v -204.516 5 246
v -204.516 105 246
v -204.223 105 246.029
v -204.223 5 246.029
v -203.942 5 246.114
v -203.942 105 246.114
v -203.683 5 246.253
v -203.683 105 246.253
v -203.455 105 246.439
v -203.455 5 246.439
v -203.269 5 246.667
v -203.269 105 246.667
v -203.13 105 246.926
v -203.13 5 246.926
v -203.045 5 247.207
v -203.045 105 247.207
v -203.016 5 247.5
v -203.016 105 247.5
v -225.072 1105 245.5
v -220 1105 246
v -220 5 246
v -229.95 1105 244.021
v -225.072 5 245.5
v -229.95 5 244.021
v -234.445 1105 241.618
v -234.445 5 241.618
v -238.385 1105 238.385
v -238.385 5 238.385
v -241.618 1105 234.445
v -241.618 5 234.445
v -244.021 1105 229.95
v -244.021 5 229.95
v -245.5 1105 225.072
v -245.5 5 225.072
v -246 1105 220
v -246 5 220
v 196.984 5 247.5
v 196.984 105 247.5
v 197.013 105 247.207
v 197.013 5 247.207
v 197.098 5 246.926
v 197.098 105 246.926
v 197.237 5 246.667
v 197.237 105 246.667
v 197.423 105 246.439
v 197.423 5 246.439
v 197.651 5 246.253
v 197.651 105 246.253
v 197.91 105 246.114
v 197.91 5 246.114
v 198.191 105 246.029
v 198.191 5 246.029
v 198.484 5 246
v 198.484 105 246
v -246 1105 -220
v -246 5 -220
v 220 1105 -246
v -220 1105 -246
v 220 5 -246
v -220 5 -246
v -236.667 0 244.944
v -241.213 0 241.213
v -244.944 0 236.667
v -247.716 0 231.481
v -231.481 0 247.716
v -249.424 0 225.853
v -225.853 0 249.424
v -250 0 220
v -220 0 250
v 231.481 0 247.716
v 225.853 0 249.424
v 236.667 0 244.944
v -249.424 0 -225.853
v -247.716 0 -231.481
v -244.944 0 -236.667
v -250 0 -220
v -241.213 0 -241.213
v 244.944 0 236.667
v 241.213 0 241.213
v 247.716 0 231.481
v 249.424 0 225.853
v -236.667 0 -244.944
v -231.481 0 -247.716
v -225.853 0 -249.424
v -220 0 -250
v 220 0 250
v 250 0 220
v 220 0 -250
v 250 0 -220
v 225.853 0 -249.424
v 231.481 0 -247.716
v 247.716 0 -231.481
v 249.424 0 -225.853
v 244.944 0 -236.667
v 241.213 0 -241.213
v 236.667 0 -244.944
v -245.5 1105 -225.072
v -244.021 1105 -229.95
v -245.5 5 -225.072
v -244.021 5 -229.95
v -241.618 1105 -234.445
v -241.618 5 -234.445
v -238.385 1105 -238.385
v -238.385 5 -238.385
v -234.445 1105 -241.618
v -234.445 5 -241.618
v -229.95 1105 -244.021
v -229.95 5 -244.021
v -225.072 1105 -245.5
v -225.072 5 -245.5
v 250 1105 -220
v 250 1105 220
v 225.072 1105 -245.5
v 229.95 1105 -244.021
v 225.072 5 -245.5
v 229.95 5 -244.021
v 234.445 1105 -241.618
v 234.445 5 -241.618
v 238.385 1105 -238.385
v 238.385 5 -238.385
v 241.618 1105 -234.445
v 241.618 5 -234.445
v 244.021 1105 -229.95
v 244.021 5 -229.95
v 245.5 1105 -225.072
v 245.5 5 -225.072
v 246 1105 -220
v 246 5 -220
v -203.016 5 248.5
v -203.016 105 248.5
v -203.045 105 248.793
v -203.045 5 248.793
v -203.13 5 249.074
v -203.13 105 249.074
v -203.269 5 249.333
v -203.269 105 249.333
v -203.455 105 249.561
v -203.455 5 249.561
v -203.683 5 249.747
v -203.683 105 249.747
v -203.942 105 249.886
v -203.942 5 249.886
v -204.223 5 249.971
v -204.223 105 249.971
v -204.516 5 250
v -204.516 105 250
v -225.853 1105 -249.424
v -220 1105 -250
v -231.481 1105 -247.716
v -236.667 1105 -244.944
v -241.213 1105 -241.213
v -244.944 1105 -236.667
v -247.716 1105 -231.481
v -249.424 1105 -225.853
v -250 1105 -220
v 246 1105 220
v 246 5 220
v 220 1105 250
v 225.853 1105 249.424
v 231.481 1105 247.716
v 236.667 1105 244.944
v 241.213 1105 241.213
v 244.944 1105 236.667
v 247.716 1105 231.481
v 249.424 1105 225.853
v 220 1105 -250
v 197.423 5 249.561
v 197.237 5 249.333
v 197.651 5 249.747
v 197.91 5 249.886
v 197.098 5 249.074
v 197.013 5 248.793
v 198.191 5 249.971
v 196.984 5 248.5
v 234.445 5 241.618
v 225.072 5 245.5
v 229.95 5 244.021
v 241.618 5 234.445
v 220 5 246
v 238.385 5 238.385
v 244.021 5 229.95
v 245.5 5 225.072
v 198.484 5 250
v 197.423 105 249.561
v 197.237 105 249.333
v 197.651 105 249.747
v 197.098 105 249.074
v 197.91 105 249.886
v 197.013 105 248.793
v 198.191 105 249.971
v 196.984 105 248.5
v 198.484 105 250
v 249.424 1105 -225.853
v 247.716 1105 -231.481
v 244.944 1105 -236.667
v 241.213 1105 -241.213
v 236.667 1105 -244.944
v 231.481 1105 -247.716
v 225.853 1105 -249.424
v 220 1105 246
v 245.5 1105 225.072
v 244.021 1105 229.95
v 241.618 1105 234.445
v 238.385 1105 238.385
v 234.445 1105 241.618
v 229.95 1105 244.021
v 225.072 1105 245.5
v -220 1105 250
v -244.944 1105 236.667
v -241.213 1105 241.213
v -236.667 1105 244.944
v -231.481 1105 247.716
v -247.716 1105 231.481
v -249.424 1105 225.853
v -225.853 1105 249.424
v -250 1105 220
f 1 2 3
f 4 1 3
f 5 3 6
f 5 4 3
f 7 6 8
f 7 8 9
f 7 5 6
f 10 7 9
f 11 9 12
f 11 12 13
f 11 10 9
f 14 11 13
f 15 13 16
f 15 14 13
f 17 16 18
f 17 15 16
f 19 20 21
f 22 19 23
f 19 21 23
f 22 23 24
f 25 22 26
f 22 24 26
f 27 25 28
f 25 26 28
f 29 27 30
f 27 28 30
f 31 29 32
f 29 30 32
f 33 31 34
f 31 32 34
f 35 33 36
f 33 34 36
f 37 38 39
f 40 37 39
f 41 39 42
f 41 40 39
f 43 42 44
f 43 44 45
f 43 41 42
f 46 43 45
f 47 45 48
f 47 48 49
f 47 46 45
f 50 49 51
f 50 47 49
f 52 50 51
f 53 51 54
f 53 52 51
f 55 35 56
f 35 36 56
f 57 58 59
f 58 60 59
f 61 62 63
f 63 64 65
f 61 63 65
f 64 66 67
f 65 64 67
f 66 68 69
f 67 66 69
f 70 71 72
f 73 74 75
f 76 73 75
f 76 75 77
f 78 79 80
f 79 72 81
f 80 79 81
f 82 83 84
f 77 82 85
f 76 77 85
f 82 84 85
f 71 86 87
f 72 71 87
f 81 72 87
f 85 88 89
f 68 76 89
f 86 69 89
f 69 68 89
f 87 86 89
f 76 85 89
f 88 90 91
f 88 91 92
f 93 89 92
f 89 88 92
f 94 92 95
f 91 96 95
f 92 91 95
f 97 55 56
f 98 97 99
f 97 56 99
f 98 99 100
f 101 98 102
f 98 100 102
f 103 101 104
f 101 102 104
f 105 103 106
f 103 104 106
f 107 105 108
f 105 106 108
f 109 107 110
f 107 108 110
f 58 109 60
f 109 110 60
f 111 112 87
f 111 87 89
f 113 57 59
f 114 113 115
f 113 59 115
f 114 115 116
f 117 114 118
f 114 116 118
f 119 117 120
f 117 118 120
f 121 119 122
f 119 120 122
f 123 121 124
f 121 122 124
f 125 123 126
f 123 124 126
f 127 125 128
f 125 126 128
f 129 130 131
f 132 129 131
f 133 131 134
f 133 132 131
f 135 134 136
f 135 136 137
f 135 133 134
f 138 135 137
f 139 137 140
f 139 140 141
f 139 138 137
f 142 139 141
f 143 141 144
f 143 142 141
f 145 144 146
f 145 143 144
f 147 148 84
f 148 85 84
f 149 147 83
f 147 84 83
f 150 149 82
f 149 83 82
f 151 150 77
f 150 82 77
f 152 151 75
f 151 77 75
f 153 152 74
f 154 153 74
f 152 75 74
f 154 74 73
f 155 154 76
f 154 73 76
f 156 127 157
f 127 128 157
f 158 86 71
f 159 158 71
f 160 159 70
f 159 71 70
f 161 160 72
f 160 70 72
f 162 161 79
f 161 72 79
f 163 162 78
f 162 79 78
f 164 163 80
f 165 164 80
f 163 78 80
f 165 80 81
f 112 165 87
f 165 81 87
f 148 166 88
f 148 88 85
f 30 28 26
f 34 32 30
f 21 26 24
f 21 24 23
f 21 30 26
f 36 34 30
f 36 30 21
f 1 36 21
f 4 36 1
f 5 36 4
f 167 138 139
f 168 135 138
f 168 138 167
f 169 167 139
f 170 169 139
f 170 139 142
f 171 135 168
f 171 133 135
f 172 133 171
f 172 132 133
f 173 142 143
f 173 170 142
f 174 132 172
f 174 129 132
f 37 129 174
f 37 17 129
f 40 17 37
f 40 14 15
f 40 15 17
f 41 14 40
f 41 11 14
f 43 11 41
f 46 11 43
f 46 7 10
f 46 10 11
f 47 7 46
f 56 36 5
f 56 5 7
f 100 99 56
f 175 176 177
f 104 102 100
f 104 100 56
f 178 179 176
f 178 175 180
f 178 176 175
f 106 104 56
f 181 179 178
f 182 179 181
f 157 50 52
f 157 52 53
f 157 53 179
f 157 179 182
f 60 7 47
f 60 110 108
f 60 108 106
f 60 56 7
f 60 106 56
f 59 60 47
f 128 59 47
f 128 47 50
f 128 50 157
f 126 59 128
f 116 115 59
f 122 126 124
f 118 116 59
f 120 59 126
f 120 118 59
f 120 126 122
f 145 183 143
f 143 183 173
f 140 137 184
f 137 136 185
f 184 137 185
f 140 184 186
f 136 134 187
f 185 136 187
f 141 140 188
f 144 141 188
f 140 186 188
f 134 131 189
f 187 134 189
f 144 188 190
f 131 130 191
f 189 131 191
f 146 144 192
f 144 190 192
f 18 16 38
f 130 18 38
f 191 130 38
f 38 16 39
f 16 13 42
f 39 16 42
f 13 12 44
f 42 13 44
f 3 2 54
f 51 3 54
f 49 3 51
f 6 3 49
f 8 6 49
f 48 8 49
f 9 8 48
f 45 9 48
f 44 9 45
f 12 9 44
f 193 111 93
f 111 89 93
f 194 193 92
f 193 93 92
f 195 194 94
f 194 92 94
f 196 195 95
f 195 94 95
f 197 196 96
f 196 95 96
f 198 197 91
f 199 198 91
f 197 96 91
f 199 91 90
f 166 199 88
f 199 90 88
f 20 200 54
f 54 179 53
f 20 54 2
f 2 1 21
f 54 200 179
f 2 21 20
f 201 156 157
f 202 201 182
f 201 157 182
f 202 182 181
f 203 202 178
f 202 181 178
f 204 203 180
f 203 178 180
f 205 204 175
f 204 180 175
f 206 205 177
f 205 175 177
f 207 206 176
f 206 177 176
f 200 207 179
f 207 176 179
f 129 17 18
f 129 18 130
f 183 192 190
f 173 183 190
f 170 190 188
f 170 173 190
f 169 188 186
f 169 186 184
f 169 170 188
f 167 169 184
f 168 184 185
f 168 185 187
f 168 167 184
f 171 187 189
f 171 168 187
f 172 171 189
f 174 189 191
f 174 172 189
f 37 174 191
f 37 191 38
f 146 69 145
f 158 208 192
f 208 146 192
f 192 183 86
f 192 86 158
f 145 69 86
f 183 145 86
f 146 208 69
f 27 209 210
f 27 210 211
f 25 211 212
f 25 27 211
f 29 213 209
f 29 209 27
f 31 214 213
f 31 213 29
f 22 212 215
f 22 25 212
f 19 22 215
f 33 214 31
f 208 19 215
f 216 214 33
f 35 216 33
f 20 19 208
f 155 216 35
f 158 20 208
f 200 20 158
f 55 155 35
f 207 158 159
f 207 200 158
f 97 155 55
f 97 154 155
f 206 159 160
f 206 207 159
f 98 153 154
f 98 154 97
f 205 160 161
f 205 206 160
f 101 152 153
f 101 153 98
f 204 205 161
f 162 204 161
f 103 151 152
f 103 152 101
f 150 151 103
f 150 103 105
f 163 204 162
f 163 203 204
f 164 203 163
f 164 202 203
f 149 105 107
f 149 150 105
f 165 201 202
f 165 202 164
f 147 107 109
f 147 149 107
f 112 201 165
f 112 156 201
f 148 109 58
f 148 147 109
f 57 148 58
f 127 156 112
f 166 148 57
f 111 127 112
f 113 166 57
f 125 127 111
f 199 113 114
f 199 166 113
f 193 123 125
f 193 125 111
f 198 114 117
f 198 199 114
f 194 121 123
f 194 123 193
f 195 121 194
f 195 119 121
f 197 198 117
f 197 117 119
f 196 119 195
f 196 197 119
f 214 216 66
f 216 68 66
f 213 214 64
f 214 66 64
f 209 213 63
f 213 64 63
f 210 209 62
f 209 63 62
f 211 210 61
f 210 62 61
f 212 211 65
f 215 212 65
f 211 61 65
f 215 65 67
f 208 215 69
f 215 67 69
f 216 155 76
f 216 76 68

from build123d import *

# Parameters (mm, degrees)
EXTRUDE_1_DEPTH = 5
EXTRUDE_2_DEPTH = 100
EXTRUDE_3_DEPTH = 1000


with BuildPart() as part:
    # 草图1 → 凸台-拉伸1 (new body)
    with BuildSketch(Plane(origin=(0, 0, 0), x_dir=(1, 0, 0), z_dir=(0, 1, 0))):
        with BuildLine():
            Line((220, 250), (-220, 250))
            ThreePointArc((-220, 250), (-241.213203436, 241.213203436), (-250, 220))
            Line((-250, 220), (-250, -220))
            ThreePointArc((-250, -220), (-241.213203436, -241.213203436), (-220, -250))
            Line((-220, -250), (220, -250))
            ThreePointArc((220, -250), (241.213203436, -241.213203436), (250, -220))
            Line((250, -220), (250, 220))
            ThreePointArc((250, 220), (241.213203436, 241.213203436), (220, 250))
        make_face()
    extrude(amount=EXTRUDE_1_DEPTH)

    # 草图2 → 凸台-拉伸2 (add)
    with BuildSketch(Plane(origin=(0, 5, 0), x_dir=(1, 0, 0), z_dir=(0, 1, 0))):
        with BuildLine():
            Line((-220, -246), (-204.515980858, -246))
            ThreePointArc((-204.515980858, -246), (-203.455320686, -246.439339828), (-203.015980858, -247.5))
            Line((-203.015980858, -247.5), (-203.015980858, -248.5))
            ThreePointArc((-203.015980858, -248.5), (-203.455320686, -249.560660172), (-204.515980858, -250))
            Line((-204.515980858, -250), (-220, -250))
            ThreePointArc((-220, -250), (-241.213203436, -241.213203436), (-250, -220))
            Line((-250, -220), (-250, 220))
            ThreePointArc((-250, 220), (-241.213203436, 241.213203436), (-220, 250))
            Line((-220, 250), (220, 250))
            ThreePointArc((220, 250), (241.213203436, 241.213203436), (250, 220))
            Line((250, 220), (250, -220))
            ThreePointArc((250, -220), (241.213203436, -241.213203436), (220, -250))
            Line((220, -250), (198.484019142, -250))
            ThreePointArc((198.484019142, -250), (197.42335897, -249.560660172), (196.984019142, -248.5))
            Line((196.984019142, -248.5), (196.984019142, -247.5))
            ThreePointArc((196.984019142, -247.5), (197.42335897, -246.439339828), (198.484019142, -246))
            Line((198.484019142, -246), (220, -246))
            ThreePointArc((220, -246), (238.384776311, -238.384776311), (246, -220))
            Line((246, -220), (246, 220))
            ThreePointArc((246, 220), (238.384776311, 238.384776311), (220, 246))
            Line((220, 246), (-220, 246))
            ThreePointArc((-220, 246), (-238.384776311, 238.384776311), (-246, 220))
            Line((-246, 220), (-246, -220))
            ThreePointArc((-246, -220), (-238.384776311, -238.384776311), (-220, -246))
        make_face()
    extrude(amount=EXTRUDE_2_DEPTH)

    # 草图3 → 凸台-拉伸3 (add)
    with BuildSketch(Plane(origin=(0, 105, 0), x_dir=(1, 0, 0), z_dir=(0, 1, 0))):
        with BuildLine():
            Line((-204.515980858, -246), (-220, -246))
            ThreePointArc((-220, -246), (-238.384776311, -238.384776311), (-246, -220))
            Line((-246, -220), (-246, 220))
            ThreePointArc((-246, 220), (-238.384776311, 238.384776311), (-220, 246))
            Line((-220, 246), (220, 246))
            ThreePointArc((220, 246), (238.384776311, 238.384776311), (246, 220))
            Line((246, 220), (246, -220))
            ThreePointArc((246, -220), (238.384776311, -238.384776311), (220, -246))
            Line((220, -246), (198.484019142, -246))
            ThreePointArc((198.484019142, -246), (197.42335897, -246.439339828), (196.984019142, -247.5))
            Line((196.984019142, -247.5), (196.984019142, -248.5))
            ThreePointArc((196.984019142, -248.5), (197.42335897, -249.560660172), (198.484019142, -250))
            Line((198.484019142, -250), (220, -250))
            ThreePointArc((220, -250), (241.213203436, -241.213203436), (250, -220))
            Line((250, -220), (250, 220))
            ThreePointArc((250, 220), (241.213203436, 241.213203436), (220, 250))
            Line((220, 250), (-220, 250))
            ThreePointArc((-220, 250), (-241.213203436, 241.213203436), (-250, 220))
            Line((-250, 220), (-250, -220))
            ThreePointArc((-250, -220), (-241.213203436, -241.213203436), (-220, -250))
            Line((-220, -250), (-204.515980858, -250))
            ThreePointArc((-204.515980858, -250), (-203.455320686, -249.560660172), (-203.015980858, -248.5))
            Line((-203.015980858, -248.5), (-203.015980858, -247.5))
            ThreePointArc((-203.015980858, -247.5), (-203.455320686, -246.439339828), (-204.515980858, -246))
        make_face()
        with BuildLine():
            Line((-204.515980858, -250), (198.484019142, -250))
            ThreePointArc((198.484019142, -250), (197.42335897, -249.560660172), (196.984019142, -248.5))
            Line((196.984019142, -248.5), (196.984019142, -247.5))
            ThreePointArc((196.984019142, -247.5), (197.42335897, -246.439339828), (198.484019142, -246))
            Line((198.484019142, -246), (-204.515980858, -246))
            ThreePointArc((-204.515980858, -246), (-203.455320686, -246.439339828), (-203.015980858, -247.5))
            Line((-203.015980858, -247.5), (-203.015980858, -248.5))
            ThreePointArc((-203.015980858, -248.5), (-203.455320686, -249.560660172), (-204.515980858, -250))
        make_face()
    extrude(amount=EXTRUDE_3_DEPTH)


solid = part.part
